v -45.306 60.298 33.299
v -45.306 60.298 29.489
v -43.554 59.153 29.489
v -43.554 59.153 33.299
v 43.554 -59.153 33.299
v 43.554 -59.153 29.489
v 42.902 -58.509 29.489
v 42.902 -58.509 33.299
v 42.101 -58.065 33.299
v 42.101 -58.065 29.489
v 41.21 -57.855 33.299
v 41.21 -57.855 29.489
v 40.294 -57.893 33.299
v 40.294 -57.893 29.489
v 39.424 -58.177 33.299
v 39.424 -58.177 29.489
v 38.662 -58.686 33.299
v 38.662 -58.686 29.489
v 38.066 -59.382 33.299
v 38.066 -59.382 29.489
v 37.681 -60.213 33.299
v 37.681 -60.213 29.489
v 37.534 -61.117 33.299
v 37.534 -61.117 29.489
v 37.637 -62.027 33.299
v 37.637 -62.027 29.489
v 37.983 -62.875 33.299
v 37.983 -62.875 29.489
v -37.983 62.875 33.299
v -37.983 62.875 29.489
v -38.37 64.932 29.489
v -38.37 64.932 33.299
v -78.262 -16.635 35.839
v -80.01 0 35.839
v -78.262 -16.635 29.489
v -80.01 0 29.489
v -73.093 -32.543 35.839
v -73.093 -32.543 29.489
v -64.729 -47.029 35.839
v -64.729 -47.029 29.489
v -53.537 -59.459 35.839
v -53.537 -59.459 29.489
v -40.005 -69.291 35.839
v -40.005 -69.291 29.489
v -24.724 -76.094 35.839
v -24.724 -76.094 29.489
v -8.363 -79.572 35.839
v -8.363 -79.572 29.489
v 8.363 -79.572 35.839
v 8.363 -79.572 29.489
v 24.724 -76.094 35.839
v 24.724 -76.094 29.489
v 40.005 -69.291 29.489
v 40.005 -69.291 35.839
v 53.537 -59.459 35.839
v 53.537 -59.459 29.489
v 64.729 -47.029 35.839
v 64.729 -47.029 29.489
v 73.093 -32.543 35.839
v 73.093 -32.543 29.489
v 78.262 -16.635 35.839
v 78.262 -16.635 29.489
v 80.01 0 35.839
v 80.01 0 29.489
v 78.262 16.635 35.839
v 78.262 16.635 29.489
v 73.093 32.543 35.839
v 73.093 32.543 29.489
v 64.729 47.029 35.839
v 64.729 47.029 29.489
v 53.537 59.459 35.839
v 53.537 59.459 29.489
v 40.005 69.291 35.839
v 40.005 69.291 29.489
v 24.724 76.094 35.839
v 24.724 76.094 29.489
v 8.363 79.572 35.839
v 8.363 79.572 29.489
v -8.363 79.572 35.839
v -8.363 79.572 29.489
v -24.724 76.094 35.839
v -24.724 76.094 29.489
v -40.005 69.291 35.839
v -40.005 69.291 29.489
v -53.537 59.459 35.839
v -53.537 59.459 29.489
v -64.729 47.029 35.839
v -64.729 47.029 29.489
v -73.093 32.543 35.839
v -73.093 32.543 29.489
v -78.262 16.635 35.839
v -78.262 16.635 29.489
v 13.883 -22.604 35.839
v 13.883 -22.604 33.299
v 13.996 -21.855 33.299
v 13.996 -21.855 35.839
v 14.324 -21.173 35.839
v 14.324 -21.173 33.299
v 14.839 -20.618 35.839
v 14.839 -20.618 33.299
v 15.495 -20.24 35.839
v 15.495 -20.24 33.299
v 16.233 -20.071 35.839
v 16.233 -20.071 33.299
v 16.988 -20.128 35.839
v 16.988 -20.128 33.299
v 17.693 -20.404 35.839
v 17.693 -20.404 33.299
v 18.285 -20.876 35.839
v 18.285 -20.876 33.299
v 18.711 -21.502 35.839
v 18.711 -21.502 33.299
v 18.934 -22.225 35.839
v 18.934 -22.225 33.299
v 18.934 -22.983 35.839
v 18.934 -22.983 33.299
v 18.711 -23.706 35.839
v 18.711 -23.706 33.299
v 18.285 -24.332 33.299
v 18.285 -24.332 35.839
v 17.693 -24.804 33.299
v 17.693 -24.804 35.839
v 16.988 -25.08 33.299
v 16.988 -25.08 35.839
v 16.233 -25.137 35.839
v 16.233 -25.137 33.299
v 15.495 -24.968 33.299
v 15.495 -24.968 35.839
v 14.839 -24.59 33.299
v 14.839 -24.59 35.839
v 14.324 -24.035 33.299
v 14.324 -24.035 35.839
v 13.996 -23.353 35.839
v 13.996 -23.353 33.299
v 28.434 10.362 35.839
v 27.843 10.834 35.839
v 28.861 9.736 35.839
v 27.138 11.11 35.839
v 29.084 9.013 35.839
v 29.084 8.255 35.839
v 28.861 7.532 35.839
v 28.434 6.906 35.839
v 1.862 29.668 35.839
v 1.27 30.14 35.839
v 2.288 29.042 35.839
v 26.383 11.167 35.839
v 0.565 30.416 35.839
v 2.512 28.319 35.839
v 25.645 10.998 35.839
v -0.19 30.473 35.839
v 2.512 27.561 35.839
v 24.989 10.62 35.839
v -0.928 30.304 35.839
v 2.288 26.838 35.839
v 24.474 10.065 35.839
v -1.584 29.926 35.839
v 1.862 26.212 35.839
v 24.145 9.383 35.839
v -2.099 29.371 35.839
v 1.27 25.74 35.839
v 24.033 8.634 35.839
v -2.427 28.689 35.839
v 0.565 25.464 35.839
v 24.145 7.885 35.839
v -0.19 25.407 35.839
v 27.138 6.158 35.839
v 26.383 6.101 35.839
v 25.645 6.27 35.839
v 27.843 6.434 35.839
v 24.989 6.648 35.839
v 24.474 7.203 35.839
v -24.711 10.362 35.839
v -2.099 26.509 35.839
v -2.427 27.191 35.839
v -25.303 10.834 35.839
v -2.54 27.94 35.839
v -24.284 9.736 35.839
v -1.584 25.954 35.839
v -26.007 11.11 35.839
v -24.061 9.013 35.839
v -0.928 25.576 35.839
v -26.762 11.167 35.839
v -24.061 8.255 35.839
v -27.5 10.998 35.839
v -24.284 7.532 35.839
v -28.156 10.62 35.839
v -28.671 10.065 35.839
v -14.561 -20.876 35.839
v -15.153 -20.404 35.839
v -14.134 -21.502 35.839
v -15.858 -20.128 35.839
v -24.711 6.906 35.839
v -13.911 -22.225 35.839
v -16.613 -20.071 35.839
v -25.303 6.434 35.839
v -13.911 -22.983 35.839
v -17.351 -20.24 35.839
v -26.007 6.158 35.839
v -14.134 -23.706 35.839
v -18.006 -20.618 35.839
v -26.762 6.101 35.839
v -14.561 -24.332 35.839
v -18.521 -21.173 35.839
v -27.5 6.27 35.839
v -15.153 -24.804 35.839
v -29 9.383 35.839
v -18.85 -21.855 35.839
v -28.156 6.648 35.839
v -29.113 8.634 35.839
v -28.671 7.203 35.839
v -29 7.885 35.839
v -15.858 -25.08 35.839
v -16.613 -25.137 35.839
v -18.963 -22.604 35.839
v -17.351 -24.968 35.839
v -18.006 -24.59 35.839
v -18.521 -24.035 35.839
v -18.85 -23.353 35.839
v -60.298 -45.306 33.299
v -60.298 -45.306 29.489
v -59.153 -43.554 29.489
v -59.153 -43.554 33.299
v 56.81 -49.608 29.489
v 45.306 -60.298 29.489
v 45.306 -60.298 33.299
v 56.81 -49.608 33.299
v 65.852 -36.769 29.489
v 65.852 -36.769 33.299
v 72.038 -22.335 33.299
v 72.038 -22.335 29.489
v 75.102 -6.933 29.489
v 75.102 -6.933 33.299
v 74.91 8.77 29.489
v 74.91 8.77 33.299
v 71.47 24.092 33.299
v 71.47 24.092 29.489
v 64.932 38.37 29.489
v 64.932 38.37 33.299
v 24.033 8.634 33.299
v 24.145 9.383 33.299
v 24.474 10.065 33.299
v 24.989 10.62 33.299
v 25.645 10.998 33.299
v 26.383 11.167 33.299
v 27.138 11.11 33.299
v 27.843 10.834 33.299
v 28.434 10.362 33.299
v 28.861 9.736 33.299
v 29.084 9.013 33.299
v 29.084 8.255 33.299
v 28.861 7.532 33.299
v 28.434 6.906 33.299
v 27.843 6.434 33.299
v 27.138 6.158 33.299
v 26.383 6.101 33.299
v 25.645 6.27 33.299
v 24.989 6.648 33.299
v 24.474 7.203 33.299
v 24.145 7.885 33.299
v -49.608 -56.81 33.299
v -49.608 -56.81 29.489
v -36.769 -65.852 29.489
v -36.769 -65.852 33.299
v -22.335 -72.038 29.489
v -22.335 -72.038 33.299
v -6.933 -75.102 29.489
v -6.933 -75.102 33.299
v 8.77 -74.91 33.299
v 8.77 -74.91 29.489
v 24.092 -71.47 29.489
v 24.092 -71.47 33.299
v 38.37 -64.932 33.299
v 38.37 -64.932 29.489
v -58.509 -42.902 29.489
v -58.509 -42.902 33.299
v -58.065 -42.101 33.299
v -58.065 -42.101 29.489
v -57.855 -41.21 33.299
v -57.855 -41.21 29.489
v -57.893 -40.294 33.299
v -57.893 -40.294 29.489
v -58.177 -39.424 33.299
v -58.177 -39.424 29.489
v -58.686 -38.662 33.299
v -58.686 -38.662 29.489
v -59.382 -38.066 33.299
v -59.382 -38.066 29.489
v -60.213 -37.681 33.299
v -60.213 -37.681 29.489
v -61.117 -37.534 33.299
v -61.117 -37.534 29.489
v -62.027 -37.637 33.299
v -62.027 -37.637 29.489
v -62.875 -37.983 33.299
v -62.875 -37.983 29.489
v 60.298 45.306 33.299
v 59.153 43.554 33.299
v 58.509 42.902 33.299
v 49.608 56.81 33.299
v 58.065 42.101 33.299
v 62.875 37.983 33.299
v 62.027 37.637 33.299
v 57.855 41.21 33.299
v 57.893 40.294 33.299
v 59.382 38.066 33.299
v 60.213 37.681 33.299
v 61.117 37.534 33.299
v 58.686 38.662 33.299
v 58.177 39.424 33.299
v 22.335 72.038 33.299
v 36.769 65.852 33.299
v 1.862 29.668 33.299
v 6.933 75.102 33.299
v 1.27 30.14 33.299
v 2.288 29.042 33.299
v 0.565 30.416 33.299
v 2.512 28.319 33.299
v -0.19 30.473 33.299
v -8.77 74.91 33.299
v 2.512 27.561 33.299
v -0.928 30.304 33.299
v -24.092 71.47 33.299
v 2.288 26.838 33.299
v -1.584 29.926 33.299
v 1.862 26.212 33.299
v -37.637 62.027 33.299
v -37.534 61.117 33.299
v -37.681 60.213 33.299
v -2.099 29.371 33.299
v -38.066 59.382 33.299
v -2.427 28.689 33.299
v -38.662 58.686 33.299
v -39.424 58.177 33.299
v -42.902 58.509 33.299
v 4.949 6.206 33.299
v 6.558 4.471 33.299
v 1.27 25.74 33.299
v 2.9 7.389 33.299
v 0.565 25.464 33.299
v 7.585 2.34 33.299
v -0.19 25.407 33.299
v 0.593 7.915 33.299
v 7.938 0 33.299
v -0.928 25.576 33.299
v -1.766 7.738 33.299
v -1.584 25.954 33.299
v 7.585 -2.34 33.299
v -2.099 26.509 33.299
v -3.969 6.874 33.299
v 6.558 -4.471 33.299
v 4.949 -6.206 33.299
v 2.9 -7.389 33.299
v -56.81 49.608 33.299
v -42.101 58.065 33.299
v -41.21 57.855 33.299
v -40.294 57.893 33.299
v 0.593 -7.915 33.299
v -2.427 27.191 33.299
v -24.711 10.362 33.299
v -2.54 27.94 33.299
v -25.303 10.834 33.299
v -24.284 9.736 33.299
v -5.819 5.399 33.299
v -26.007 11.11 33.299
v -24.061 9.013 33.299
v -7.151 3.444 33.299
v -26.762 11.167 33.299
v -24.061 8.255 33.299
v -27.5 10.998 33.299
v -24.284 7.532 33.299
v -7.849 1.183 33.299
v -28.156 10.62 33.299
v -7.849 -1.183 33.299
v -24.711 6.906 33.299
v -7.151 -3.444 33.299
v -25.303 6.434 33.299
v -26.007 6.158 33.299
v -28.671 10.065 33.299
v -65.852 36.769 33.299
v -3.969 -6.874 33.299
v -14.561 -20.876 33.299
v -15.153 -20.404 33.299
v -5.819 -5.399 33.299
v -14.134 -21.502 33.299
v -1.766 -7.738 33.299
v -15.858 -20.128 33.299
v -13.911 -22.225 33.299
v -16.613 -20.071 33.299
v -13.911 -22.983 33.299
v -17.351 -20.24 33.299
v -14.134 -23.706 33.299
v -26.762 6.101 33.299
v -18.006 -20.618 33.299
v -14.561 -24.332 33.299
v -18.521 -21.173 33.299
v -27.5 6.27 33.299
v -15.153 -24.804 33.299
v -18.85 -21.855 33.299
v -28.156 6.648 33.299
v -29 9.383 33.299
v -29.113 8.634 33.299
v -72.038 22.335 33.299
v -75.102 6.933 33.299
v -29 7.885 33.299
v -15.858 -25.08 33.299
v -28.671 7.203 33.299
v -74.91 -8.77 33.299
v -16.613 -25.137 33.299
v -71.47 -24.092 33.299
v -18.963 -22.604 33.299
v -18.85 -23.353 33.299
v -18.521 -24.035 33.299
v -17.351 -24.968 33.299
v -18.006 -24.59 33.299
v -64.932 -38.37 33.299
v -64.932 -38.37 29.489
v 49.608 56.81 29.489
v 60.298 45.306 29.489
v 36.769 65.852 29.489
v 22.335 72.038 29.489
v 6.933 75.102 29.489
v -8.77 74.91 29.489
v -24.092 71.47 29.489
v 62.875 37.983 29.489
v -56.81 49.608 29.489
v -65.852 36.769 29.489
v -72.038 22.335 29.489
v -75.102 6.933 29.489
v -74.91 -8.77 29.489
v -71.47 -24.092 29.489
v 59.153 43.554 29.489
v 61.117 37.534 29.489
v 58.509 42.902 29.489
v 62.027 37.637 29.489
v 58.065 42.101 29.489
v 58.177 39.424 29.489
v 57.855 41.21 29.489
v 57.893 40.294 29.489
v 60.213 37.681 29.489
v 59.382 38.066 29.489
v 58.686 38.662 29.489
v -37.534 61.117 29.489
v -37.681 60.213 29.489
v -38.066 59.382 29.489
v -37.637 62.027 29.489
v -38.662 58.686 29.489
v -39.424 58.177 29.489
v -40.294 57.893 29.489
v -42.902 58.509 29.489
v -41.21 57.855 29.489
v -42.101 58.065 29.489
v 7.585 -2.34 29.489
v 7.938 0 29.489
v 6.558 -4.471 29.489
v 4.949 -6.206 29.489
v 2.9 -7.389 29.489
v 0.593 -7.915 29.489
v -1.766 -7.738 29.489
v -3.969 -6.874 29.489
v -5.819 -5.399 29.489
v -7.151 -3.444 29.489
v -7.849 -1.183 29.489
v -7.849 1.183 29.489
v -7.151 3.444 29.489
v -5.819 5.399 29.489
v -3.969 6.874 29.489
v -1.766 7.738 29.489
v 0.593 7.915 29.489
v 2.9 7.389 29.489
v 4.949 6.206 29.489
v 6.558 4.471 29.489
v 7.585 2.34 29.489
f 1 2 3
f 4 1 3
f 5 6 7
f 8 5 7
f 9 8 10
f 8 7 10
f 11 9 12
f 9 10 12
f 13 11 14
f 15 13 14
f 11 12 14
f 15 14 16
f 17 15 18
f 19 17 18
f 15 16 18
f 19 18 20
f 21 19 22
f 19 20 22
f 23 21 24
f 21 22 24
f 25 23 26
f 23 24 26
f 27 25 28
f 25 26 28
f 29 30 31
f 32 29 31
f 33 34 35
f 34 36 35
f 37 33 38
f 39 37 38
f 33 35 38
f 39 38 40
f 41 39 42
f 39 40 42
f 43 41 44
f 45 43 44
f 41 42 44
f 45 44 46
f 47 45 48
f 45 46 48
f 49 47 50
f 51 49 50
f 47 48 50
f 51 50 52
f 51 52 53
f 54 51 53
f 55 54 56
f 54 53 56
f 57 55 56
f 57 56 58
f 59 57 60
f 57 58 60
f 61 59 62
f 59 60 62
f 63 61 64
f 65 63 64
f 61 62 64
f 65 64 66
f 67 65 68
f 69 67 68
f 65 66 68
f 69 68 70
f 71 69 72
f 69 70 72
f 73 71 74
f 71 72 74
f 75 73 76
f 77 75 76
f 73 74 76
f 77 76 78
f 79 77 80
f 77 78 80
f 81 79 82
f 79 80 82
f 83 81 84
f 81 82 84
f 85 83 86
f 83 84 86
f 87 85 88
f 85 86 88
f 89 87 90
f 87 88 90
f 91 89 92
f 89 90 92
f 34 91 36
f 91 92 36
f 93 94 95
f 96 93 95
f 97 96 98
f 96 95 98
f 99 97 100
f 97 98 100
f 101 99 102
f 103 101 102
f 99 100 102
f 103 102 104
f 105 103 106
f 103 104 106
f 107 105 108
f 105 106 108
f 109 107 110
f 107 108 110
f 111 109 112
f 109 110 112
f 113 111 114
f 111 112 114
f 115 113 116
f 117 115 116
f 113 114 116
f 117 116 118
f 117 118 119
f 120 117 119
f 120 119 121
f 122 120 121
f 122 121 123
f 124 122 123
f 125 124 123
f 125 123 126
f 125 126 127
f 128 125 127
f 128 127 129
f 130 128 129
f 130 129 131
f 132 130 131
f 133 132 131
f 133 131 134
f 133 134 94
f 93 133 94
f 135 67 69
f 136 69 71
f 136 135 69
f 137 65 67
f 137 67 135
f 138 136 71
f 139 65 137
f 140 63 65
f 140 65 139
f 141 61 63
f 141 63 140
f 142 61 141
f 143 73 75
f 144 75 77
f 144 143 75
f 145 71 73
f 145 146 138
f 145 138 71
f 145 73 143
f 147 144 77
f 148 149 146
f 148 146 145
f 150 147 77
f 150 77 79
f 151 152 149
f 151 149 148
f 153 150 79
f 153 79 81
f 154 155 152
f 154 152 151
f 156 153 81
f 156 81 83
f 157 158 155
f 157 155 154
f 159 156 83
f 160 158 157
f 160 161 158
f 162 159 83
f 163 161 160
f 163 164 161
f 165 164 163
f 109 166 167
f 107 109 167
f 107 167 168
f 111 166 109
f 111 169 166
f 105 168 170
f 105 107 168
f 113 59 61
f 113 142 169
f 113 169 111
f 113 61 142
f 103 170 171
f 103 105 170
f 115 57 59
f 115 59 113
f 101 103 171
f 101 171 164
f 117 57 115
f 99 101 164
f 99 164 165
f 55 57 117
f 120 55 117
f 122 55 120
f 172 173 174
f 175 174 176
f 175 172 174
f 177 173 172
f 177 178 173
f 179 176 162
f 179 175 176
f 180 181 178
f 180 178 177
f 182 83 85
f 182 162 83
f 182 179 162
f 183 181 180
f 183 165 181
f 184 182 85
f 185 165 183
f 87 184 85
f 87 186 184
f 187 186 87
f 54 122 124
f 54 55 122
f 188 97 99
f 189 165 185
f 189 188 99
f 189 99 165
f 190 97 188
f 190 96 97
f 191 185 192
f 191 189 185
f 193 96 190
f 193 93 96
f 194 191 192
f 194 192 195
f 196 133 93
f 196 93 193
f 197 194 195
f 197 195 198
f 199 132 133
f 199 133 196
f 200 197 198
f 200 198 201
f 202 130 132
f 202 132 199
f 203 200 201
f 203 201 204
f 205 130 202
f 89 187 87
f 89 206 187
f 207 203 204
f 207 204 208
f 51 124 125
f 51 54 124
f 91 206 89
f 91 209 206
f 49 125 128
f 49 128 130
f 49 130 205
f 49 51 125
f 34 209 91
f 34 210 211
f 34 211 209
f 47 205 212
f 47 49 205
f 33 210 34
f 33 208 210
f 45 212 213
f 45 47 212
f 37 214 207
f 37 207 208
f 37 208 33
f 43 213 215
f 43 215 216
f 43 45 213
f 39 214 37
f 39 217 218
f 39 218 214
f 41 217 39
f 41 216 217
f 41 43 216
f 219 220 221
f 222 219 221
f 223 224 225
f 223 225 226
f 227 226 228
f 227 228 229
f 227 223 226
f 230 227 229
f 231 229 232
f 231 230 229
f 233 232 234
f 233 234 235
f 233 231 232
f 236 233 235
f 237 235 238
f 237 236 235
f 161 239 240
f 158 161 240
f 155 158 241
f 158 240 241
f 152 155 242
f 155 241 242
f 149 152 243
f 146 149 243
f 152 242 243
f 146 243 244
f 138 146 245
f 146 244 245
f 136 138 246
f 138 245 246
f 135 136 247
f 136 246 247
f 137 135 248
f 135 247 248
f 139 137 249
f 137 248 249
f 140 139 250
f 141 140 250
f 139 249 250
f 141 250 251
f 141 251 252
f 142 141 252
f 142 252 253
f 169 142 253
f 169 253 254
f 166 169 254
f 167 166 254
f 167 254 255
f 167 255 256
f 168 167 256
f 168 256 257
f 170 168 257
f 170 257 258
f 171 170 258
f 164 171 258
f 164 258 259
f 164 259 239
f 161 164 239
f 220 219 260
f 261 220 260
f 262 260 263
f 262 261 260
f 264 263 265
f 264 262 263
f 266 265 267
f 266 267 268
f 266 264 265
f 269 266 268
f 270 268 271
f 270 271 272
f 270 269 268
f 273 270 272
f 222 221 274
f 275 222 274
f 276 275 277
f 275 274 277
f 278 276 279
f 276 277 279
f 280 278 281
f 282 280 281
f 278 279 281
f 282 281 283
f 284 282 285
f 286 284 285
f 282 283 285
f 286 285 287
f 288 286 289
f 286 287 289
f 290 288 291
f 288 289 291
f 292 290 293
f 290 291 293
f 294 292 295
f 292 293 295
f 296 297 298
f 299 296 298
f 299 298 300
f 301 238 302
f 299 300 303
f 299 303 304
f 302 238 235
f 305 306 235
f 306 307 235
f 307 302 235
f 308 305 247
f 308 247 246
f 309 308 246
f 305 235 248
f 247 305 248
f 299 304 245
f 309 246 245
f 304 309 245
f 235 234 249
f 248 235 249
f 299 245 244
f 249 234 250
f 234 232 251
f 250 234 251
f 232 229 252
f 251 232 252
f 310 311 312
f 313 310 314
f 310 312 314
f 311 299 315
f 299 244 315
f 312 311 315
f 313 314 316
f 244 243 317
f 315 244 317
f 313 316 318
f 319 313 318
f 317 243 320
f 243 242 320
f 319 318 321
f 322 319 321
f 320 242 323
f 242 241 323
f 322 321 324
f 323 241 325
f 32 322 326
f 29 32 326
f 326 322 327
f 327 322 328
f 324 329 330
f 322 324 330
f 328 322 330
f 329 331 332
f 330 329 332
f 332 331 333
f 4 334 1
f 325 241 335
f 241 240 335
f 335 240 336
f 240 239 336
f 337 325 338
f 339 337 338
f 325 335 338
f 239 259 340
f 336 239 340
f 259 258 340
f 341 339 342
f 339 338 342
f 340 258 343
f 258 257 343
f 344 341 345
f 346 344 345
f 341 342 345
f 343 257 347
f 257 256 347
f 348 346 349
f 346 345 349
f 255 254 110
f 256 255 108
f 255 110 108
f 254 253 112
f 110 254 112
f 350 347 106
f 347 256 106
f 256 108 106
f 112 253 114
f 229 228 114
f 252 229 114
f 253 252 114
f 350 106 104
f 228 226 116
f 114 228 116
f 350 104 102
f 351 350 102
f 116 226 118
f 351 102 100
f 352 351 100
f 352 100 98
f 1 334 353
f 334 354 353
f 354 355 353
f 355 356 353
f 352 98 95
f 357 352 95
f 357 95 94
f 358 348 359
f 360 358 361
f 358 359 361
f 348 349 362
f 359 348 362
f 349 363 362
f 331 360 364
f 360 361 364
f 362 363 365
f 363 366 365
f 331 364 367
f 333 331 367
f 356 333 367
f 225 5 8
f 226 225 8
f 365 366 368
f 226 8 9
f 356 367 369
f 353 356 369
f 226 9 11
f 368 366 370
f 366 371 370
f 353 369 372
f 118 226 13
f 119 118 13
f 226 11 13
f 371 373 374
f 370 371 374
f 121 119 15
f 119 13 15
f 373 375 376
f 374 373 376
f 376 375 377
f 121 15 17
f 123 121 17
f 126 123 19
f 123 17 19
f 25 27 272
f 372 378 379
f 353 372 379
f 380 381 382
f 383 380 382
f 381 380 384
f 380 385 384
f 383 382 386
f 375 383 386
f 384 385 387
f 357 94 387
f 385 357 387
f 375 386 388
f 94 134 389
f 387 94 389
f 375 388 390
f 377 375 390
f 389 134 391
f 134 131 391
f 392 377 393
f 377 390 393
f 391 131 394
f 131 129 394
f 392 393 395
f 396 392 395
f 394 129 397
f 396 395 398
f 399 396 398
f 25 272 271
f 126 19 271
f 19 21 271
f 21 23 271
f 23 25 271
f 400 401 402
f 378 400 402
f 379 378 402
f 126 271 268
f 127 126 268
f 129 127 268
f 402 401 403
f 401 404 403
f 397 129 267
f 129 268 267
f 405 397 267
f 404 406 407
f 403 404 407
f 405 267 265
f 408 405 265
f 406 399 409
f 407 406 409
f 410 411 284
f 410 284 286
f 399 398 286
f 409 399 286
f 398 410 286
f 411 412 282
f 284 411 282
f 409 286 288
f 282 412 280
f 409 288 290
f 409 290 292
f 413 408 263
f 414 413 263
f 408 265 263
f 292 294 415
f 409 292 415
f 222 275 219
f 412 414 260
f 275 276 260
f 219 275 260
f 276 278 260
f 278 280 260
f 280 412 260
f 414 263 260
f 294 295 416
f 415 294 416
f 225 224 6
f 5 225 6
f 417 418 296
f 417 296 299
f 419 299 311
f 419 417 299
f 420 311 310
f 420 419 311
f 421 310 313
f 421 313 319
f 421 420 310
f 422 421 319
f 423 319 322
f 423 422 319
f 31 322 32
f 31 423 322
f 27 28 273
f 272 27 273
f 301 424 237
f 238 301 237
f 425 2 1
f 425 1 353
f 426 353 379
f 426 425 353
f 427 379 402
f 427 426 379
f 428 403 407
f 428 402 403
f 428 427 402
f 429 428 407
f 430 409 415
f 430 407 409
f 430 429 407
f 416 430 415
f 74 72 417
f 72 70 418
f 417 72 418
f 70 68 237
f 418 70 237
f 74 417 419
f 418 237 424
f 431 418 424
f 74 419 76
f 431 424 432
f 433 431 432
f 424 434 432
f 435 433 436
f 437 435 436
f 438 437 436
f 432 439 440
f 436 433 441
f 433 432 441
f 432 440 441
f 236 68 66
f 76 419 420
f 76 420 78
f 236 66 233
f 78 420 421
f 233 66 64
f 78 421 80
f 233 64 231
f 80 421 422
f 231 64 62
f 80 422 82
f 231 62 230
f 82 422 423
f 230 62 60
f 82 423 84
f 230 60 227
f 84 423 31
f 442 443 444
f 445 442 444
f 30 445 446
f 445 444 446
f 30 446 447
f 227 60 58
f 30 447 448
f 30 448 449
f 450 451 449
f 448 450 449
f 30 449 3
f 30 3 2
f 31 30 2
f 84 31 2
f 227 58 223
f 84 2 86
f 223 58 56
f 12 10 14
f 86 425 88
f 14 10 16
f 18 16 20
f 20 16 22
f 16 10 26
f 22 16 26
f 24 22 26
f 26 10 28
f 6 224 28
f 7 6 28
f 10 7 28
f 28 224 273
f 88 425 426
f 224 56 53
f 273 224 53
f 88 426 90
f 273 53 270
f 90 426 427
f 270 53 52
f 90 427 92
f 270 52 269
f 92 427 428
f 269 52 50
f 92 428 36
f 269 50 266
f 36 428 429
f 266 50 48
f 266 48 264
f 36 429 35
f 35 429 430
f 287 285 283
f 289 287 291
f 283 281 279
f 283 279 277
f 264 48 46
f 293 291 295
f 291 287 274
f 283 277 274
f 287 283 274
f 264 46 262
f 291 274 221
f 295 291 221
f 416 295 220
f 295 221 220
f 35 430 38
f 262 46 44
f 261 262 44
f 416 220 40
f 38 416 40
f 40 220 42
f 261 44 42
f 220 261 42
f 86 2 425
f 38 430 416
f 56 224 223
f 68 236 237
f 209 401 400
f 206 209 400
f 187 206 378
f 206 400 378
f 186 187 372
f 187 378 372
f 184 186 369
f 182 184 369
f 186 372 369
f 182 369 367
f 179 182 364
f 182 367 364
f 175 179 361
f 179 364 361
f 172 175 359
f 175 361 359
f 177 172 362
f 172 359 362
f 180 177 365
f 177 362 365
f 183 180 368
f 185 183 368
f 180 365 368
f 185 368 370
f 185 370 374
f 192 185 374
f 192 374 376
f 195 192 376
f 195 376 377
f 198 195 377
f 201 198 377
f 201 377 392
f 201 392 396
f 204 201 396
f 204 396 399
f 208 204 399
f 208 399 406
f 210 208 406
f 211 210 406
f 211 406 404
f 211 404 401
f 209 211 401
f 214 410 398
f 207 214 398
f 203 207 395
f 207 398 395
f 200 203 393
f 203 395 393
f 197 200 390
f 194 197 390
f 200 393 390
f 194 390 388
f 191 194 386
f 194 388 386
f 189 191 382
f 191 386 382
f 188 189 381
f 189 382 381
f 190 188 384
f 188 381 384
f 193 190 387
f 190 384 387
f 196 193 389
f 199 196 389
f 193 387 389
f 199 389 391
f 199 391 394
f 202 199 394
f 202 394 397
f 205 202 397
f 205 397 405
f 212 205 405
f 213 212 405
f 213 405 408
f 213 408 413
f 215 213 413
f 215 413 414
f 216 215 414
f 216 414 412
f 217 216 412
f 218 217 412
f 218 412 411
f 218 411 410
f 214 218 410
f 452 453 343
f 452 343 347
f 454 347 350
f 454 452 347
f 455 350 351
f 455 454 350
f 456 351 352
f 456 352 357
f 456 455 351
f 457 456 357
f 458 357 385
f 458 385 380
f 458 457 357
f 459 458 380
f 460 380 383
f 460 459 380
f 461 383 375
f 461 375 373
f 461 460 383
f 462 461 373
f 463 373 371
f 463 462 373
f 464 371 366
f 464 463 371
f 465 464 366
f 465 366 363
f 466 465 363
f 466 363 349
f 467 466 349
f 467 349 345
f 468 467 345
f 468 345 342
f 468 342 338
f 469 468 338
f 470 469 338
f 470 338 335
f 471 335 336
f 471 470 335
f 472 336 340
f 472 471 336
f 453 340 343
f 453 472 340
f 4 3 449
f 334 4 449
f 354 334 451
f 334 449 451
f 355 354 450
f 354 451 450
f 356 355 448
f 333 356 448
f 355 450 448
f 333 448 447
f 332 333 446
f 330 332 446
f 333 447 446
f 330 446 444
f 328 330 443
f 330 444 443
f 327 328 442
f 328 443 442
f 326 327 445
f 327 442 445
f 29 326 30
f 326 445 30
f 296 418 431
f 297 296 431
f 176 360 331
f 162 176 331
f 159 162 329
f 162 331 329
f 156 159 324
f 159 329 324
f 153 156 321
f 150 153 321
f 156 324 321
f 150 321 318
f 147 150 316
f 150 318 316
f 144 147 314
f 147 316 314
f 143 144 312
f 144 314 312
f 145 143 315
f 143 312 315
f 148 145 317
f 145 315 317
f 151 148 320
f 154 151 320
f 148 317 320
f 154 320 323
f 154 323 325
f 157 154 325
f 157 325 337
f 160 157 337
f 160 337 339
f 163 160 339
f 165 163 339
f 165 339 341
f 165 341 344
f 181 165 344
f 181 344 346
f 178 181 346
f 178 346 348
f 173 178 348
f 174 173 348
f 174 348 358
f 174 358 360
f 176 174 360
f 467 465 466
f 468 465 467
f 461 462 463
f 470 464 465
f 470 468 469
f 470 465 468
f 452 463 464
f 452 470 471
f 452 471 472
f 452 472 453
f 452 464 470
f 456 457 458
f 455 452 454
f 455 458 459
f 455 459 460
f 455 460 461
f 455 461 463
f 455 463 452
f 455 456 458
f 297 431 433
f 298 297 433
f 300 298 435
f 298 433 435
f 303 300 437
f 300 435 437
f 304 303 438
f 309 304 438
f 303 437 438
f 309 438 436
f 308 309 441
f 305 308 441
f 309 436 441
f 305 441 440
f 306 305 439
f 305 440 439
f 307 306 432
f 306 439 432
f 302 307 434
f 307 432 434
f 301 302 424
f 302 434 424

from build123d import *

# Parameters (mm, degrees)
SKETCH1_R           = 7.9375
BOSS_EXTRUDE2_DEPTH = 4.0894
SKETCH4_R           = 80.01
SKETCH4_R_2         = 75.421450769
BOSS_EXTRUDE3_DEPTH = 3.81
BOSS_EXTRUDE5_START = -3.81
BOSS_EXTRUDE5_DEPTH = 3.81
SKETCH6_R           = 80.01
BOSS_EXTRUDE6_DEPTH = 2.54
BOSS_EXTRUDE7_START = 3.81
SKETCH8_R           = 7.9375
BOSS_EXTRUDE7_DEPTH = 3.81
SKETCH9_R           = 2.54
CUT_EXTRUDE2_DEPTH  = 117.930855287


with BuildPart() as part:
    # Sketch1 → Boss-Extrude2 (new body)
    with BuildSketch(Plane.XY):
        with BuildLine():
            Line((-0.762, 75.421450769), (0.762, 75.421450769))
            Line((0.762, 75.421450769), (1.456984931, 73.511995363))
            ThreePointArc((1.456984931, 73.511995363), (2.339997211, 71.173530048), (4.594157789, 70.093302846))
            ThreePointArc((4.594157789, 70.093302846), (6.970031654, 70.870061558), (8.150720614, 73.073264748))
            Line((8.150720614, 73.073264748), (9.088993796, 74.875670761))
            Line((9.088993796, 74.875670761), (10.599955765, 74.676748844))
            Line((10.599955765, 74.676748844), (11.03976106, 72.692915357))
            ThreePointArc((11.03976106, 72.692915357), (11.609988074, 70.259199706), (13.703866053, 68.893987001))
            ThreePointArc((13.703866053, 68.893987001), (16.160801344, 69.353986665), (17.61896507, 71.384230312))
            Line((17.61896507, 71.384230312), (18.784472389, 73.048747266))
            Line((18.784472389, 73.048747266), (20.256543348, 72.654307042))
            Line((20.256543348, 72.654307042), (20.433643817, 70.630039415))
            ThreePointArc((20.433643817, 70.630039415), (20.681328823, 68.142714978), (22.579097369, 66.515875937))
            ThreePointArc((22.579097369, 66.515875937), (25.075055243, 66.651245832), (26.785744149, 68.473791905))
            Line((26.785744149, 68.473791905), (28.15854345, 69.971939453))
            Line((28.15854345, 69.971939453), (29.566535858, 69.388729902))
            Line((29.566535858, 69.388729902), (29.477901263, 67.358663916))
            ThreePointArc((29.477901263, 67.358663916), (29.398806302, 64.860289504), (31.067994069, 62.999659794))
            ThreePointArc((31.067994069, 62.999659794), (33.560267995, 62.808083704), (35.494211718, 64.391747933))
            Line((35.494211718, 64.391747933), (37.050814027, 65.697892356))
            Line((37.050814027, 65.697892356), (38.370636742, 64.935892356))
            Line((38.370636742, 64.935892356), (38.017783645, 62.934763002))
            ThreePointArc((38.017783645, 62.934763002), (37.613262053, 60.468086493), (39.025308777, 58.405502006))
            ThreePointArc((39.025308777, 58.405502006), (41.471255256, 57.89025785), (43.595363485, 59.207943302))
            Line((43.595363485, 59.207943302), (45.309134903, 60.299736106))
            Line((45.309134903, 60.299736106), (46.518205393, 59.371983688))
            Line((46.518205393, 59.371983688), (45.907171209, 57.434030844))
            ThreePointArc((45.907171209, 57.434030844), (45.184144463, 55.041257758), (46.314889632, 52.812009885))
            ThreePointArc((46.314889632, 52.812009885), (48.672657842, 51.981913634), (50.950586495, 53.011074345))
            Line((50.950586495, 53.011074345), (52.792203918, 53.869834653))
            Line((52.792203918, 53.869834653), (53.869834653, 52.792203918))
            Line((53.869834653, 52.792203918), (53.011074345, 50.950586495))
            ThreePointArc((53.011074345, 50.950586495), (51.981913634, 48.672657842), (52.812009885, 46.314889632))
            ThreePointArc((52.812009885, 46.314889632), (55.041257758, 45.184144463), (57.434030844, 45.907171209))
            Line((57.434030844, 45.907171209), (59.371983688, 46.518205393))
            Line((59.371983688, 46.518205393), (60.299736106, 45.309134903))
            Line((60.299736106, 45.309134903), (59.207943302, 43.595363485))
            ThreePointArc((59.207943302, 43.595363485), (57.89025785, 41.471255256), (58.405502006, 39.025308777))
            ThreePointArc((58.405502006, 39.025308777), (60.468086493, 37.613262053), (62.934763002, 38.017783645))
            Line((62.934763002, 38.017783645), (64.935892356, 38.370636742))
            Line((64.935892356, 38.370636742), (65.697892356, 37.050814027))
            Line((65.697892356, 37.050814027), (64.391747933, 35.494211718))
            ThreePointArc((64.391747933, 35.494211718), (62.808083704, 33.560267995), (62.999659794, 31.067994069))
            ThreePointArc((62.999659794, 31.067994069), (64.860289504, 29.398806302), (67.358663916, 29.477901263))
            Line((67.358663916, 29.477901263), (69.388729902, 29.566535858))
            Line((69.388729902, 29.566535858), (69.971939453, 28.15854345))
            Line((69.971939453, 28.15854345), (68.473791905, 26.785744149))
            ThreePointArc((68.473791905, 26.785744149), (66.651245832, 25.075055243), (66.515875937, 22.579097369))
            ThreePointArc((66.515875937, 22.579097369), (68.142714978, 20.681328823), (70.630039415, 20.433643817))
            Line((70.630039415, 20.433643817), (72.654307042, 20.256543348))
            Line((72.654307042, 20.256543348), (73.048747266, 18.784472389))
            Line((73.048747266, 18.784472389), (71.384230312, 17.61896507))
            ThreePointArc((71.384230312, 17.61896507), (69.353986665, 16.160801344), (68.893987001, 13.703866053))
            ThreePointArc((68.893987001, 13.703866053), (70.259199706, 11.609988074), (72.692915357, 11.03976106))
            Line((72.692915357, 11.03976106), (74.676748844, 10.599955765))
            Line((74.676748844, 10.599955765), (74.875670761, 9.088993796))
            Line((74.875670761, 9.088993796), (73.073264748, 8.150720614))
            ThreePointArc((73.073264748, 8.150720614), (70.870061558, 6.970031654), (70.093302846, 4.594157789))
            ThreePointArc((70.093302846, 4.594157789), (71.173530048, 2.339997211), (73.511995363, 1.456984931))
            Line((73.511995363, 1.456984931), (75.421450769, 0.762))
            Line((75.421450769, 0.762), (75.421450769, -0.762))
            Line((75.421450769, -0.762), (73.511995363, -1.456984931))
            ThreePointArc((73.511995363, -1.456984931), (71.173530048, -2.339997211), (70.093302846, -4.594157789))
            ThreePointArc((70.093302846, -4.594157789), (70.870061558, -6.970031654), (73.073264748, -8.150720614))
            Line((73.073264748, -8.150720614), (74.875670761, -9.088993796))
            Line((74.875670761, -9.088993796), (74.676748844, -10.599955765))
            Line((74.676748844, -10.599955765), (72.692915357, -11.03976106))
            ThreePointArc((72.692915357, -11.03976106), (70.259199706, -11.609988074), (68.893987001, -13.703866053))
            ThreePointArc((68.893987001, -13.703866053), (69.353986665, -16.160801344), (71.384230312, -17.61896507))
            Line((71.384230312, -17.61896507), (73.048747266, -18.784472389))
            Line((73.048747266, -18.784472389), (72.654307042, -20.256543348))
            Line((72.654307042, -20.256543348), (70.630039415, -20.433643817))
            ThreePointArc((70.630039415, -20.433643817), (68.142714978, -20.681328823), (66.515875937, -22.579097369))
            ThreePointArc((66.515875937, -22.579097369), (66.651245832, -25.075055243), (68.473791905, -26.785744149))
            Line((68.473791905, -26.785744149), (69.971939453, -28.15854345))
            Line((69.971939453, -28.15854345), (69.388729902, -29.566535858))
            Line((69.388729902, -29.566535858), (67.358663916, -29.477901263))
            ThreePointArc((67.358663916, -29.477901263), (64.860289504, -29.398806302), (62.999659794, -31.067994069))
            ThreePointArc((62.999659794, -31.067994069), (62.808083704, -33.560267995), (64.391747933, -35.494211718))
            Line((64.391747933, -35.494211718), (65.697892356, -37.050814027))
            Line((65.697892356, -37.050814027), (64.935892356, -38.370636742))
            Line((64.935892356, -38.370636742), (62.934763002, -38.017783645))
            ThreePointArc((62.934763002, -38.017783645), (60.468086493, -37.613262053), (58.405502006, -39.025308777))
            ThreePointArc((58.405502006, -39.025308777), (57.89025785, -41.471255256), (59.207943302, -43.595363485))
            Line((59.207943302, -43.595363485), (60.299736106, -45.309134903))
            Line((60.299736106, -45.309134903), (59.371983688, -46.518205393))
            Line((59.371983688, -46.518205393), (57.434030844, -45.907171209))
            ThreePointArc((57.434030844, -45.907171209), (55.041257758, -45.184144463), (52.812009885, -46.314889632))
            ThreePointArc((52.812009885, -46.314889632), (51.981913634, -48.672657842), (53.011074345, -50.950586495))
            Line((53.011074345, -50.950586495), (53.869834653, -52.792203918))
            Line((53.869834653, -52.792203918), (52.792203918, -53.869834653))
            Line((52.792203918, -53.869834653), (50.950586495, -53.011074345))
            ThreePointArc((50.950586495, -53.011074345), (48.672657842, -51.981913634), (46.314889632, -52.812009885))
            ThreePointArc((46.314889632, -52.812009885), (45.184144463, -55.041257758), (45.907171209, -57.434030844))
            Line((45.907171209, -57.434030844), (46.518205393, -59.371983688))
            Line((46.518205393, -59.371983688), (45.309134903, -60.299736106))
            Line((45.309134903, -60.299736106), (43.595363485, -59.207943302))
            ThreePointArc((43.595363485, -59.207943302), (41.471255256, -57.89025785), (39.025308777, -58.405502006))
            ThreePointArc((39.025308777, -58.405502006), (37.613262053, -60.468086493), (38.017783645, -62.934763002))
            Line((38.017783645, -62.934763002), (38.370636742, -64.935892356))
            Line((38.370636742, -64.935892356), (37.050814027, -65.697892356))
            Line((37.050814027, -65.697892356), (35.494211718, -64.391747933))
            ThreePointArc((35.494211718, -64.391747933), (33.560267995, -62.808083704), (31.067994069, -62.999659794))
            ThreePointArc((31.067994069, -62.999659794), (29.398806302, -64.860289504), (29.477901263, -67.358663916))
            Line((29.477901263, -67.358663916), (29.566535858, -69.388729902))
            Line((29.566535858, -69.388729902), (28.15854345, -69.971939453))
            Line((28.15854345, -69.971939453), (26.785744149, -68.473791905))
            ThreePointArc((26.785744149, -68.473791905), (25.075055243, -66.651245832), (22.579097369, -66.515875937))
            ThreePointArc((22.579097369, -66.515875937), (20.681328823, -68.142714978), (20.433643817, -70.630039415))
            Line((20.433643817, -70.630039415), (20.256543348, -72.654307042))
            Line((20.256543348, -72.654307042), (18.784472389, -73.048747266))
            Line((18.784472389, -73.048747266), (17.61896507, -71.384230312))
            ThreePointArc((17.61896507, -71.384230312), (16.160801344, -69.353986665), (13.703866053, -68.893987001))
            ThreePointArc((13.703866053, -68.893987001), (11.609988074, -70.259199706), (11.03976106, -72.692915357))
            Line((11.03976106, -72.692915357), (10.599955765, -74.676748844))
            Line((10.599955765, -74.676748844), (9.088993796, -74.875670761))
            Line((9.088993796, -74.875670761), (8.150720614, -73.073264748))
            ThreePointArc((8.150720614, -73.073264748), (6.970031654, -70.870061558), (4.594157789, -70.093302846))
            ThreePointArc((4.594157789, -70.093302846), (2.339997211, -71.173530048), (1.456984931, -73.511995363))
            Line((1.456984931, -73.511995363), (0.762, -75.421450769))
            Line((0.762, -75.421450769), (-0.762, -75.421450769))
            Line((-0.762, -75.421450769), (-1.456984931, -73.511995363))
            ThreePointArc((-1.456984931, -73.511995363), (-2.339997211, -71.173530048), (-4.594157789, -70.093302846))
            ThreePointArc((-4.594157789, -70.093302846), (-6.970031654, -70.870061558), (-8.150720614, -73.073264748))
            Line((-8.150720614, -73.073264748), (-9.088993796, -74.875670761))
            Line((-9.088993796, -74.875670761), (-10.599955765, -74.676748844))
            Line((-10.599955765, -74.676748844), (-11.03976106, -72.692915357))
            ThreePointArc((-11.03976106, -72.692915357), (-11.609988074, -70.259199706), (-13.703866053, -68.893987001))
            ThreePointArc((-13.703866053, -68.893987001), (-16.160801344, -69.353986665), (-17.61896507, -71.384230312))
            Line((-17.61896507, -71.384230312), (-18.784472389, -73.048747266))
            Line((-18.784472389, -73.048747266), (-20.256543348, -72.654307042))
            Line((-20.256543348, -72.654307042), (-20.433643817, -70.630039415))
            ThreePointArc((-20.433643817, -70.630039415), (-20.681328823, -68.142714978), (-22.579097369, -66.515875937))
            ThreePointArc((-22.579097369, -66.515875937), (-25.075055243, -66.651245832), (-26.785744149, -68.473791905))
            Line((-26.785744149, -68.473791905), (-28.15854345, -69.971939453))
            Line((-28.15854345, -69.971939453), (-29.566535858, -69.388729902))
            Line((-29.566535858, -69.388729902), (-29.477901263, -67.358663916))
            ThreePointArc((-29.477901263, -67.358663916), (-29.398806302, -64.860289504), (-31.067994069, -62.999659794))
            ThreePointArc((-31.067994069, -62.999659794), (-33.560267995, -62.808083704), (-35.494211718, -64.391747933))
            Line((-35.494211718, -64.391747933), (-37.050814027, -65.697892356))
            Line((-37.050814027, -65.697892356), (-38.370636742, -64.935892356))
            Line((-38.370636742, -64.935892356), (-38.017783645, -62.934763002))
            ThreePointArc((-38.017783645, -62.934763002), (-37.613262053, -60.468086493), (-39.025308777, -58.405502006))
            ThreePointArc((-39.025308777, -58.405502006), (-41.471255256, -57.89025785), (-43.595363485, -59.207943302))
            Line((-43.595363485, -59.207943302), (-45.309134903, -60.299736106))
            Line((-45.309134903, -60.299736106), (-46.518205393, -59.371983688))
            Line((-46.518205393, -59.371983688), (-45.907171209, -57.434030844))
            ThreePointArc((-45.907171209, -57.434030844), (-45.184144463, -55.041257758), (-46.314889632, -52.812009885))
            ThreePointArc((-46.314889632, -52.812009885), (-48.672657842, -51.981913634), (-50.950586495, -53.011074345))
            Line((-50.950586495, -53.011074345), (-52.792203918, -53.869834653))
            Line((-52.792203918, -53.869834653), (-53.869834653, -52.792203918))
            Line((-53.869834653, -52.792203918), (-53.011074345, -50.950586495))
            ThreePointArc((-53.011074345, -50.950586495), (-51.981913634, -48.672657842), (-52.812009885, -46.314889632))
            ThreePointArc((-52.812009885, -46.314889632), (-55.041257758, -45.184144463), (-57.434030844, -45.907171209))
            Line((-57.434030844, -45.907171209), (-59.371983688, -46.518205393))
            Line((-59.371983688, -46.518205393), (-60.299736106, -45.309134903))
            Line((-60.299736106, -45.309134903), (-59.207943302, -43.595363485))
            ThreePointArc((-59.207943302, -43.595363485), (-57.89025785, -41.471255256), (-58.405502006, -39.025308777))
            ThreePointArc((-58.405502006, -39.025308777), (-60.468086493, -37.613262053), (-62.934763002, -38.017783645))
            Line((-62.934763002, -38.017783645), (-64.935892356, -38.370636742))
            Line((-64.935892356, -38.370636742), (-65.697892356, -37.050814027))
            Line((-65.697892356, -37.050814027), (-64.391747933, -35.494211718))
            ThreePointArc((-64.391747933, -35.494211718), (-62.808083704, -33.560267995), (-62.999659794, -31.067994069))
            ThreePointArc((-62.999659794, -31.067994069), (-64.860289504, -29.398806302), (-67.358663916, -29.477901263))
            Line((-67.358663916, -29.477901263), (-69.388729902, -29.566535858))
            Line((-69.388729902, -29.566535858), (-69.971939453, -28.15854345))
            Line((-69.971939453, -28.15854345), (-68.473791905, -26.785744149))
            ThreePointArc((-68.473791905, -26.785744149), (-66.651245832, -25.075055243), (-66.515875937, -22.579097369))
            ThreePointArc((-66.515875937, -22.579097369), (-68.142714978, -20.681328823), (-70.630039415, -20.433643817))
            Line((-70.630039415, -20.433643817), (-72.654307042, -20.256543348))
            Line((-72.654307042, -20.256543348), (-73.048747266, -18.784472389))
            Line((-73.048747266, -18.784472389), (-71.384230312, -17.61896507))
            ThreePointArc((-71.384230312, -17.61896507), (-69.353986665, -16.160801344), (-68.893987001, -13.703866053))
            ThreePointArc((-68.893987001, -13.703866053), (-70.259199706, -11.609988074), (-72.692915357, -11.03976106))
            Line((-72.692915357, -11.03976106), (-74.676748844, -10.599955765))
            Line((-74.676748844, -10.599955765), (-74.875670761, -9.088993796))
            Line((-74.875670761, -9.088993796), (-73.073264748, -8.150720614))
            ThreePointArc((-73.073264748, -8.150720614), (-70.870061558, -6.970031654), (-70.093302846, -4.594157789))
            ThreePointArc((-70.093302846, -4.594157789), (-71.173530048, -2.339997211), (-73.511995363, -1.456984931))
            Line((-73.511995363, -1.456984931), (-75.421450769, -0.762))
            Line((-75.421450769, -0.762), (-75.421450769, 0.762))
            Line((-75.421450769, 0.762), (-73.511995363, 1.456984931))
            ThreePointArc((-73.511995363, 1.456984931), (-71.173530048, 2.339997211), (-70.093302846, 4.594157789))
            ThreePointArc((-70.093302846, 4.594157789), (-70.870061558, 6.970031654), (-73.073264748, 8.150720614))
            Line((-73.073264748, 8.150720614), (-74.875670761, 9.088993796))
            Line((-74.875670761, 9.088993796), (-74.676748844, 10.599955765))
            Line((-74.676748844, 10.599955765), (-72.692915357, 11.03976106))
            ThreePointArc((-72.692915357, 11.03976106), (-70.259199706, 11.609988074), (-68.893987001, 13.703866053))
            ThreePointArc((-68.893987001, 13.703866053), (-69.353986665, 16.160801344), (-71.384230312, 17.61896507))
            Line((-71.384230312, 17.61896507), (-73.048747266, 18.784472389))
            Line((-73.048747266, 18.784472389), (-72.654307042, 20.256543348))
            Line((-72.654307042, 20.256543348), (-70.630039415, 20.433643817))
            ThreePointArc((-70.630039415, 20.433643817), (-68.142714978, 20.681328823), (-66.515875937, 22.579097369))
            ThreePointArc((-66.515875937, 22.579097369), (-66.651245832, 25.075055243), (-68.473791905, 26.785744149))
            Line((-68.473791905, 26.785744149), (-69.971939453, 28.15854345))
            Line((-69.971939453, 28.15854345), (-69.388729902, 29.566535858))
            Line((-69.388729902, 29.566535858), (-67.358663916, 29.477901263))
            ThreePointArc((-67.358663916, 29.477901263), (-64.860289504, 29.398806302), (-62.999659794, 31.067994069))
            ThreePointArc((-62.999659794, 31.067994069), (-62.808083704, 33.560267995), (-64.391747933, 35.494211718))
            Line((-64.391747933, 35.494211718), (-65.697892356, 37.050814027))
            Line((-65.697892356, 37.050814027), (-64.935892356, 38.370636742))
            Line((-64.935892356, 38.370636742), (-62.934763002, 38.017783645))
            ThreePointArc((-62.934763002, 38.017783645), (-60.468086493, 37.613262053), (-58.405502006, 39.025308777))
            ThreePointArc((-58.405502006, 39.025308777), (-57.89025785, 41.471255256), (-59.207943302, 43.595363485))
            Line((-59.207943302, 43.595363485), (-60.299736106, 45.309134903))
            Line((-60.299736106, 45.309134903), (-59.371983688, 46.518205393))
            Line((-59.371983688, 46.518205393), (-57.434030844, 45.907171209))
            ThreePointArc((-57.434030844, 45.907171209), (-55.041257758, 45.184144463), (-52.812009885, 46.314889632))
            ThreePointArc((-52.812009885, 46.314889632), (-51.981913634, 48.672657842), (-53.011074345, 50.950586495))
            Line((-53.011074345, 50.950586495), (-53.869834653, 52.792203918))
            Line((-53.869834653, 52.792203918), (-52.792203918, 53.869834653))
            Line((-52.792203918, 53.869834653), (-50.950586495, 53.011074345))
            ThreePointArc((-50.950586495, 53.011074345), (-48.672657842, 51.981913634), (-46.314889632, 52.812009885))
            ThreePointArc((-46.314889632, 52.812009885), (-45.184144463, 55.041257758), (-45.907171209, 57.434030844))
            Line((-45.907171209, 57.434030844), (-46.518205393, 59.371983688))
            Line((-46.518205393, 59.371983688), (-45.309134903, 60.299736106))
            Line((-45.309134903, 60.299736106), (-43.595363485, 59.207943302))
            ThreePointArc((-43.595363485, 59.207943302), (-41.471255256, 57.89025785), (-39.025308777, 58.405502006))
            ThreePointArc((-39.025308777, 58.405502006), (-37.613262053, 60.468086493), (-38.017783645, 62.934763002))
            Line((-38.017783645, 62.934763002), (-38.370636742, 64.935892356))
            Line((-38.370636742, 64.935892356), (-37.050814027, 65.697892356))
            Line((-37.050814027, 65.697892356), (-35.494211718, 64.391747933))
            ThreePointArc((-35.494211718, 64.391747933), (-33.560267995, 62.808083704), (-31.067994069, 62.999659794))
            ThreePointArc((-31.067994069, 62.999659794), (-29.398806302, 64.860289504), (-29.477901263, 67.358663916))
            Line((-29.477901263, 67.358663916), (-29.566535858, 69.388729902))
            Line((-29.566535858, 69.388729902), (-28.15854345, 69.971939453))
            Line((-28.15854345, 69.971939453), (-26.785744149, 68.473791905))
            ThreePointArc((-26.785744149, 68.473791905), (-25.075055243, 66.651245832), (-22.579097369, 66.515875937))
            ThreePointArc((-22.579097369, 66.515875937), (-20.681328823, 68.142714978), (-20.433643817, 70.630039415))
            Line((-20.433643817, 70.630039415), (-20.256543348, 72.654307042))
            Line((-20.256543348, 72.654307042), (-18.784472389, 73.048747266))
            Line((-18.784472389, 73.048747266), (-17.61896507, 71.384230312))
            ThreePointArc((-17.61896507, 71.384230312), (-16.160801344, 69.353986665), (-13.703866053, 68.893987001))
            ThreePointArc((-13.703866053, 68.893987001), (-11.609988074, 70.259199706), (-11.03976106, 72.692915357))
            Line((-11.03976106, 72.692915357), (-10.599955765, 74.676748844))
            Line((-10.599955765, 74.676748844), (-9.088993796, 74.875670761))
            Line((-9.088993796, 74.875670761), (-8.150720614, 73.073264748))
            ThreePointArc((-8.150720614, 73.073264748), (-6.970031654, 70.870061558), (-4.594157789, 70.093302846))
            ThreePointArc((-4.594157789, 70.093302846), (-2.339997211, 71.173530048), (-1.456984931, 73.511995363))
            Line((-1.456984931, 73.511995363), (-0.762, 75.421450769))
        make_face()
        Circle(SKETCH1_R, mode=Mode.SUBTRACT)
    extrude(amount=BOSS_EXTRUDE2_DEPTH)

    # Sketch3 → Cut-Revolve3 (revolve, cut)
    with BuildSketch(Plane(origin=(0, 0, 0), x_dir=(0, 0, -1), z_dir=(1, 0, 0))):
        Polygon((-4.752293352, 76.364789012), (-4.752293352, 70.630039415), (-4.0894, 70.630039415), (-3.848714616, 73.457461189), (-3.3274, 75.421450769), (-3.3274, 76.364789012), align=None)
        Polygon((-0.762, 75.421450769), (-0.762, 76.364789012), (0.662893352, 76.364789012), (0.662893352, 70.630039415), (0, 70.630039415), (-0.240685384, 73.457461189), align=None)
    revolve(axis=Axis((0, 0, 4.0894), (0, 0, -1)), mode=Mode.SUBTRACT)


with BuildPart() as body_2:
    # Sketch4 → Boss-Extrude3 (new body)
    with BuildSketch(Plane.XY.offset(29.4894)):
        with Locations(Location((0, 0, 0), (0, 0, 180))):
            Circle(SKETCH4_R)
        with Locations(Location((0, 0, 0), (0, 0, 180))):
            Circle(SKETCH4_R_2, mode=Mode.SUBTRACT)
    extrude(amount=BOSS_EXTRUDE3_DEPTH)

    # Sketch5 → Boss-Extrude5 (add)
    with BuildSketch(Plane.XY.offset(33.2994).offset(BOSS_EXTRUDE5_START)):
        with BuildLine():
            Line((-45.305667206, 60.29752694), (-43.553929762, 59.152800496))
            ThreePointArc((-43.553929762, 59.152800496), (-39.025308777, 58.405502006), (-37.982694335, 62.875380996))
            Line((-37.982694335, 62.875380996), (-38.369922769, 64.931843211))
            ThreePointArc((-38.369922769, 64.931843211), (-41.901912978, 62.71064443), (-45.305667206, 60.29752694))
        make_face()
        with BuildLine():
            Line((60.29752694, 45.305667206), (59.152800496, 43.553929762))
            ThreePointArc((59.152800496, 43.553929762), (58.405502006, 39.025308777), (62.875380996, 37.982694335))
            Line((62.875380996, 37.982694335), (64.931843211, 38.369922769))
            ThreePointArc((64.931843211, 38.369922769), (62.71064443, 41.901912978), (60.29752694, 45.305667206))
        make_face()
        with BuildLine():
            Line((45.305667206, -60.29752694), (43.553929762, -59.152800496))
            ThreePointArc((43.553929762, -59.152800496), (39.025308777, -58.405502006), (37.982694335, -62.875380996))
            Line((37.982694335, -62.875380996), (38.369922769, -64.931843211))
            ThreePointArc((38.369922769, -64.931843211), (41.901912978, -62.71064443), (45.305667206, -60.29752694))
        make_face()
        with BuildLine():
            Line((-60.29752694, -45.305667206), (-59.152800496, -43.553929762))
            ThreePointArc((-59.152800496, -43.553929762), (-58.405502006, -39.025308777), (-62.875380996, -37.982694335))
            Line((-62.875380996, -37.982694335), (-64.931843211, -38.369922769))
            ThreePointArc((-64.931843211, -38.369922769), (-62.71064443, -41.901912978), (-60.29752694, -45.305667206))
        make_face()
    extrude(amount=BOSS_EXTRUDE5_DEPTH)

    # Sketch6 → Boss-Extrude6 (add)
    with BuildSketch(Plane.XY.offset(33.2994)):
        with Locations(Location((0, 0, 0), (0, 0, 180))):
            Circle(SKETCH6_R)
    extrude(amount=BOSS_EXTRUDE6_DEPTH)

    # Sketch8 → Boss-Extrude7 (add)
    with BuildSketch(Plane(origin=(0, 0, 33.2994), x_dir=(-1, 0, 0), z_dir=(0, 0, -1)).offset(BOSS_EXTRUDE7_START)):
        with Locations(Location((0, 0, 0), (0, 0, 180))):
            Circle(SKETCH8_R)
    extrude(amount=-BOSS_EXTRUDE7_DEPTH)

    # Sketch9 → Cut-Extrude2 (cut, through all)
    with BuildSketch(Plane(origin=(0, 0, 29.4894), x_dir=(-1, 0, 0), z_dir=(0, 0, -1))):
        with Locations((0, 27.94)):
            Circle(SKETCH9_R)
        with Locations((26.572519065, 8.633934823)):
            Circle(SKETCH9_R)
        with Locations((16.422719949, -22.603934823)):
            Circle(SKETCH9_R)
        with Locations((-16.422719949, -22.603934823)):
            Circle(SKETCH9_R)
        with Locations((-26.572519065, 8.633934823)):
            Circle(SKETCH9_R)
    extrude(amount=-CUT_EXTRUDE2_DEPTH, mode=Mode.SUBTRACT)


solid = body_2.part
